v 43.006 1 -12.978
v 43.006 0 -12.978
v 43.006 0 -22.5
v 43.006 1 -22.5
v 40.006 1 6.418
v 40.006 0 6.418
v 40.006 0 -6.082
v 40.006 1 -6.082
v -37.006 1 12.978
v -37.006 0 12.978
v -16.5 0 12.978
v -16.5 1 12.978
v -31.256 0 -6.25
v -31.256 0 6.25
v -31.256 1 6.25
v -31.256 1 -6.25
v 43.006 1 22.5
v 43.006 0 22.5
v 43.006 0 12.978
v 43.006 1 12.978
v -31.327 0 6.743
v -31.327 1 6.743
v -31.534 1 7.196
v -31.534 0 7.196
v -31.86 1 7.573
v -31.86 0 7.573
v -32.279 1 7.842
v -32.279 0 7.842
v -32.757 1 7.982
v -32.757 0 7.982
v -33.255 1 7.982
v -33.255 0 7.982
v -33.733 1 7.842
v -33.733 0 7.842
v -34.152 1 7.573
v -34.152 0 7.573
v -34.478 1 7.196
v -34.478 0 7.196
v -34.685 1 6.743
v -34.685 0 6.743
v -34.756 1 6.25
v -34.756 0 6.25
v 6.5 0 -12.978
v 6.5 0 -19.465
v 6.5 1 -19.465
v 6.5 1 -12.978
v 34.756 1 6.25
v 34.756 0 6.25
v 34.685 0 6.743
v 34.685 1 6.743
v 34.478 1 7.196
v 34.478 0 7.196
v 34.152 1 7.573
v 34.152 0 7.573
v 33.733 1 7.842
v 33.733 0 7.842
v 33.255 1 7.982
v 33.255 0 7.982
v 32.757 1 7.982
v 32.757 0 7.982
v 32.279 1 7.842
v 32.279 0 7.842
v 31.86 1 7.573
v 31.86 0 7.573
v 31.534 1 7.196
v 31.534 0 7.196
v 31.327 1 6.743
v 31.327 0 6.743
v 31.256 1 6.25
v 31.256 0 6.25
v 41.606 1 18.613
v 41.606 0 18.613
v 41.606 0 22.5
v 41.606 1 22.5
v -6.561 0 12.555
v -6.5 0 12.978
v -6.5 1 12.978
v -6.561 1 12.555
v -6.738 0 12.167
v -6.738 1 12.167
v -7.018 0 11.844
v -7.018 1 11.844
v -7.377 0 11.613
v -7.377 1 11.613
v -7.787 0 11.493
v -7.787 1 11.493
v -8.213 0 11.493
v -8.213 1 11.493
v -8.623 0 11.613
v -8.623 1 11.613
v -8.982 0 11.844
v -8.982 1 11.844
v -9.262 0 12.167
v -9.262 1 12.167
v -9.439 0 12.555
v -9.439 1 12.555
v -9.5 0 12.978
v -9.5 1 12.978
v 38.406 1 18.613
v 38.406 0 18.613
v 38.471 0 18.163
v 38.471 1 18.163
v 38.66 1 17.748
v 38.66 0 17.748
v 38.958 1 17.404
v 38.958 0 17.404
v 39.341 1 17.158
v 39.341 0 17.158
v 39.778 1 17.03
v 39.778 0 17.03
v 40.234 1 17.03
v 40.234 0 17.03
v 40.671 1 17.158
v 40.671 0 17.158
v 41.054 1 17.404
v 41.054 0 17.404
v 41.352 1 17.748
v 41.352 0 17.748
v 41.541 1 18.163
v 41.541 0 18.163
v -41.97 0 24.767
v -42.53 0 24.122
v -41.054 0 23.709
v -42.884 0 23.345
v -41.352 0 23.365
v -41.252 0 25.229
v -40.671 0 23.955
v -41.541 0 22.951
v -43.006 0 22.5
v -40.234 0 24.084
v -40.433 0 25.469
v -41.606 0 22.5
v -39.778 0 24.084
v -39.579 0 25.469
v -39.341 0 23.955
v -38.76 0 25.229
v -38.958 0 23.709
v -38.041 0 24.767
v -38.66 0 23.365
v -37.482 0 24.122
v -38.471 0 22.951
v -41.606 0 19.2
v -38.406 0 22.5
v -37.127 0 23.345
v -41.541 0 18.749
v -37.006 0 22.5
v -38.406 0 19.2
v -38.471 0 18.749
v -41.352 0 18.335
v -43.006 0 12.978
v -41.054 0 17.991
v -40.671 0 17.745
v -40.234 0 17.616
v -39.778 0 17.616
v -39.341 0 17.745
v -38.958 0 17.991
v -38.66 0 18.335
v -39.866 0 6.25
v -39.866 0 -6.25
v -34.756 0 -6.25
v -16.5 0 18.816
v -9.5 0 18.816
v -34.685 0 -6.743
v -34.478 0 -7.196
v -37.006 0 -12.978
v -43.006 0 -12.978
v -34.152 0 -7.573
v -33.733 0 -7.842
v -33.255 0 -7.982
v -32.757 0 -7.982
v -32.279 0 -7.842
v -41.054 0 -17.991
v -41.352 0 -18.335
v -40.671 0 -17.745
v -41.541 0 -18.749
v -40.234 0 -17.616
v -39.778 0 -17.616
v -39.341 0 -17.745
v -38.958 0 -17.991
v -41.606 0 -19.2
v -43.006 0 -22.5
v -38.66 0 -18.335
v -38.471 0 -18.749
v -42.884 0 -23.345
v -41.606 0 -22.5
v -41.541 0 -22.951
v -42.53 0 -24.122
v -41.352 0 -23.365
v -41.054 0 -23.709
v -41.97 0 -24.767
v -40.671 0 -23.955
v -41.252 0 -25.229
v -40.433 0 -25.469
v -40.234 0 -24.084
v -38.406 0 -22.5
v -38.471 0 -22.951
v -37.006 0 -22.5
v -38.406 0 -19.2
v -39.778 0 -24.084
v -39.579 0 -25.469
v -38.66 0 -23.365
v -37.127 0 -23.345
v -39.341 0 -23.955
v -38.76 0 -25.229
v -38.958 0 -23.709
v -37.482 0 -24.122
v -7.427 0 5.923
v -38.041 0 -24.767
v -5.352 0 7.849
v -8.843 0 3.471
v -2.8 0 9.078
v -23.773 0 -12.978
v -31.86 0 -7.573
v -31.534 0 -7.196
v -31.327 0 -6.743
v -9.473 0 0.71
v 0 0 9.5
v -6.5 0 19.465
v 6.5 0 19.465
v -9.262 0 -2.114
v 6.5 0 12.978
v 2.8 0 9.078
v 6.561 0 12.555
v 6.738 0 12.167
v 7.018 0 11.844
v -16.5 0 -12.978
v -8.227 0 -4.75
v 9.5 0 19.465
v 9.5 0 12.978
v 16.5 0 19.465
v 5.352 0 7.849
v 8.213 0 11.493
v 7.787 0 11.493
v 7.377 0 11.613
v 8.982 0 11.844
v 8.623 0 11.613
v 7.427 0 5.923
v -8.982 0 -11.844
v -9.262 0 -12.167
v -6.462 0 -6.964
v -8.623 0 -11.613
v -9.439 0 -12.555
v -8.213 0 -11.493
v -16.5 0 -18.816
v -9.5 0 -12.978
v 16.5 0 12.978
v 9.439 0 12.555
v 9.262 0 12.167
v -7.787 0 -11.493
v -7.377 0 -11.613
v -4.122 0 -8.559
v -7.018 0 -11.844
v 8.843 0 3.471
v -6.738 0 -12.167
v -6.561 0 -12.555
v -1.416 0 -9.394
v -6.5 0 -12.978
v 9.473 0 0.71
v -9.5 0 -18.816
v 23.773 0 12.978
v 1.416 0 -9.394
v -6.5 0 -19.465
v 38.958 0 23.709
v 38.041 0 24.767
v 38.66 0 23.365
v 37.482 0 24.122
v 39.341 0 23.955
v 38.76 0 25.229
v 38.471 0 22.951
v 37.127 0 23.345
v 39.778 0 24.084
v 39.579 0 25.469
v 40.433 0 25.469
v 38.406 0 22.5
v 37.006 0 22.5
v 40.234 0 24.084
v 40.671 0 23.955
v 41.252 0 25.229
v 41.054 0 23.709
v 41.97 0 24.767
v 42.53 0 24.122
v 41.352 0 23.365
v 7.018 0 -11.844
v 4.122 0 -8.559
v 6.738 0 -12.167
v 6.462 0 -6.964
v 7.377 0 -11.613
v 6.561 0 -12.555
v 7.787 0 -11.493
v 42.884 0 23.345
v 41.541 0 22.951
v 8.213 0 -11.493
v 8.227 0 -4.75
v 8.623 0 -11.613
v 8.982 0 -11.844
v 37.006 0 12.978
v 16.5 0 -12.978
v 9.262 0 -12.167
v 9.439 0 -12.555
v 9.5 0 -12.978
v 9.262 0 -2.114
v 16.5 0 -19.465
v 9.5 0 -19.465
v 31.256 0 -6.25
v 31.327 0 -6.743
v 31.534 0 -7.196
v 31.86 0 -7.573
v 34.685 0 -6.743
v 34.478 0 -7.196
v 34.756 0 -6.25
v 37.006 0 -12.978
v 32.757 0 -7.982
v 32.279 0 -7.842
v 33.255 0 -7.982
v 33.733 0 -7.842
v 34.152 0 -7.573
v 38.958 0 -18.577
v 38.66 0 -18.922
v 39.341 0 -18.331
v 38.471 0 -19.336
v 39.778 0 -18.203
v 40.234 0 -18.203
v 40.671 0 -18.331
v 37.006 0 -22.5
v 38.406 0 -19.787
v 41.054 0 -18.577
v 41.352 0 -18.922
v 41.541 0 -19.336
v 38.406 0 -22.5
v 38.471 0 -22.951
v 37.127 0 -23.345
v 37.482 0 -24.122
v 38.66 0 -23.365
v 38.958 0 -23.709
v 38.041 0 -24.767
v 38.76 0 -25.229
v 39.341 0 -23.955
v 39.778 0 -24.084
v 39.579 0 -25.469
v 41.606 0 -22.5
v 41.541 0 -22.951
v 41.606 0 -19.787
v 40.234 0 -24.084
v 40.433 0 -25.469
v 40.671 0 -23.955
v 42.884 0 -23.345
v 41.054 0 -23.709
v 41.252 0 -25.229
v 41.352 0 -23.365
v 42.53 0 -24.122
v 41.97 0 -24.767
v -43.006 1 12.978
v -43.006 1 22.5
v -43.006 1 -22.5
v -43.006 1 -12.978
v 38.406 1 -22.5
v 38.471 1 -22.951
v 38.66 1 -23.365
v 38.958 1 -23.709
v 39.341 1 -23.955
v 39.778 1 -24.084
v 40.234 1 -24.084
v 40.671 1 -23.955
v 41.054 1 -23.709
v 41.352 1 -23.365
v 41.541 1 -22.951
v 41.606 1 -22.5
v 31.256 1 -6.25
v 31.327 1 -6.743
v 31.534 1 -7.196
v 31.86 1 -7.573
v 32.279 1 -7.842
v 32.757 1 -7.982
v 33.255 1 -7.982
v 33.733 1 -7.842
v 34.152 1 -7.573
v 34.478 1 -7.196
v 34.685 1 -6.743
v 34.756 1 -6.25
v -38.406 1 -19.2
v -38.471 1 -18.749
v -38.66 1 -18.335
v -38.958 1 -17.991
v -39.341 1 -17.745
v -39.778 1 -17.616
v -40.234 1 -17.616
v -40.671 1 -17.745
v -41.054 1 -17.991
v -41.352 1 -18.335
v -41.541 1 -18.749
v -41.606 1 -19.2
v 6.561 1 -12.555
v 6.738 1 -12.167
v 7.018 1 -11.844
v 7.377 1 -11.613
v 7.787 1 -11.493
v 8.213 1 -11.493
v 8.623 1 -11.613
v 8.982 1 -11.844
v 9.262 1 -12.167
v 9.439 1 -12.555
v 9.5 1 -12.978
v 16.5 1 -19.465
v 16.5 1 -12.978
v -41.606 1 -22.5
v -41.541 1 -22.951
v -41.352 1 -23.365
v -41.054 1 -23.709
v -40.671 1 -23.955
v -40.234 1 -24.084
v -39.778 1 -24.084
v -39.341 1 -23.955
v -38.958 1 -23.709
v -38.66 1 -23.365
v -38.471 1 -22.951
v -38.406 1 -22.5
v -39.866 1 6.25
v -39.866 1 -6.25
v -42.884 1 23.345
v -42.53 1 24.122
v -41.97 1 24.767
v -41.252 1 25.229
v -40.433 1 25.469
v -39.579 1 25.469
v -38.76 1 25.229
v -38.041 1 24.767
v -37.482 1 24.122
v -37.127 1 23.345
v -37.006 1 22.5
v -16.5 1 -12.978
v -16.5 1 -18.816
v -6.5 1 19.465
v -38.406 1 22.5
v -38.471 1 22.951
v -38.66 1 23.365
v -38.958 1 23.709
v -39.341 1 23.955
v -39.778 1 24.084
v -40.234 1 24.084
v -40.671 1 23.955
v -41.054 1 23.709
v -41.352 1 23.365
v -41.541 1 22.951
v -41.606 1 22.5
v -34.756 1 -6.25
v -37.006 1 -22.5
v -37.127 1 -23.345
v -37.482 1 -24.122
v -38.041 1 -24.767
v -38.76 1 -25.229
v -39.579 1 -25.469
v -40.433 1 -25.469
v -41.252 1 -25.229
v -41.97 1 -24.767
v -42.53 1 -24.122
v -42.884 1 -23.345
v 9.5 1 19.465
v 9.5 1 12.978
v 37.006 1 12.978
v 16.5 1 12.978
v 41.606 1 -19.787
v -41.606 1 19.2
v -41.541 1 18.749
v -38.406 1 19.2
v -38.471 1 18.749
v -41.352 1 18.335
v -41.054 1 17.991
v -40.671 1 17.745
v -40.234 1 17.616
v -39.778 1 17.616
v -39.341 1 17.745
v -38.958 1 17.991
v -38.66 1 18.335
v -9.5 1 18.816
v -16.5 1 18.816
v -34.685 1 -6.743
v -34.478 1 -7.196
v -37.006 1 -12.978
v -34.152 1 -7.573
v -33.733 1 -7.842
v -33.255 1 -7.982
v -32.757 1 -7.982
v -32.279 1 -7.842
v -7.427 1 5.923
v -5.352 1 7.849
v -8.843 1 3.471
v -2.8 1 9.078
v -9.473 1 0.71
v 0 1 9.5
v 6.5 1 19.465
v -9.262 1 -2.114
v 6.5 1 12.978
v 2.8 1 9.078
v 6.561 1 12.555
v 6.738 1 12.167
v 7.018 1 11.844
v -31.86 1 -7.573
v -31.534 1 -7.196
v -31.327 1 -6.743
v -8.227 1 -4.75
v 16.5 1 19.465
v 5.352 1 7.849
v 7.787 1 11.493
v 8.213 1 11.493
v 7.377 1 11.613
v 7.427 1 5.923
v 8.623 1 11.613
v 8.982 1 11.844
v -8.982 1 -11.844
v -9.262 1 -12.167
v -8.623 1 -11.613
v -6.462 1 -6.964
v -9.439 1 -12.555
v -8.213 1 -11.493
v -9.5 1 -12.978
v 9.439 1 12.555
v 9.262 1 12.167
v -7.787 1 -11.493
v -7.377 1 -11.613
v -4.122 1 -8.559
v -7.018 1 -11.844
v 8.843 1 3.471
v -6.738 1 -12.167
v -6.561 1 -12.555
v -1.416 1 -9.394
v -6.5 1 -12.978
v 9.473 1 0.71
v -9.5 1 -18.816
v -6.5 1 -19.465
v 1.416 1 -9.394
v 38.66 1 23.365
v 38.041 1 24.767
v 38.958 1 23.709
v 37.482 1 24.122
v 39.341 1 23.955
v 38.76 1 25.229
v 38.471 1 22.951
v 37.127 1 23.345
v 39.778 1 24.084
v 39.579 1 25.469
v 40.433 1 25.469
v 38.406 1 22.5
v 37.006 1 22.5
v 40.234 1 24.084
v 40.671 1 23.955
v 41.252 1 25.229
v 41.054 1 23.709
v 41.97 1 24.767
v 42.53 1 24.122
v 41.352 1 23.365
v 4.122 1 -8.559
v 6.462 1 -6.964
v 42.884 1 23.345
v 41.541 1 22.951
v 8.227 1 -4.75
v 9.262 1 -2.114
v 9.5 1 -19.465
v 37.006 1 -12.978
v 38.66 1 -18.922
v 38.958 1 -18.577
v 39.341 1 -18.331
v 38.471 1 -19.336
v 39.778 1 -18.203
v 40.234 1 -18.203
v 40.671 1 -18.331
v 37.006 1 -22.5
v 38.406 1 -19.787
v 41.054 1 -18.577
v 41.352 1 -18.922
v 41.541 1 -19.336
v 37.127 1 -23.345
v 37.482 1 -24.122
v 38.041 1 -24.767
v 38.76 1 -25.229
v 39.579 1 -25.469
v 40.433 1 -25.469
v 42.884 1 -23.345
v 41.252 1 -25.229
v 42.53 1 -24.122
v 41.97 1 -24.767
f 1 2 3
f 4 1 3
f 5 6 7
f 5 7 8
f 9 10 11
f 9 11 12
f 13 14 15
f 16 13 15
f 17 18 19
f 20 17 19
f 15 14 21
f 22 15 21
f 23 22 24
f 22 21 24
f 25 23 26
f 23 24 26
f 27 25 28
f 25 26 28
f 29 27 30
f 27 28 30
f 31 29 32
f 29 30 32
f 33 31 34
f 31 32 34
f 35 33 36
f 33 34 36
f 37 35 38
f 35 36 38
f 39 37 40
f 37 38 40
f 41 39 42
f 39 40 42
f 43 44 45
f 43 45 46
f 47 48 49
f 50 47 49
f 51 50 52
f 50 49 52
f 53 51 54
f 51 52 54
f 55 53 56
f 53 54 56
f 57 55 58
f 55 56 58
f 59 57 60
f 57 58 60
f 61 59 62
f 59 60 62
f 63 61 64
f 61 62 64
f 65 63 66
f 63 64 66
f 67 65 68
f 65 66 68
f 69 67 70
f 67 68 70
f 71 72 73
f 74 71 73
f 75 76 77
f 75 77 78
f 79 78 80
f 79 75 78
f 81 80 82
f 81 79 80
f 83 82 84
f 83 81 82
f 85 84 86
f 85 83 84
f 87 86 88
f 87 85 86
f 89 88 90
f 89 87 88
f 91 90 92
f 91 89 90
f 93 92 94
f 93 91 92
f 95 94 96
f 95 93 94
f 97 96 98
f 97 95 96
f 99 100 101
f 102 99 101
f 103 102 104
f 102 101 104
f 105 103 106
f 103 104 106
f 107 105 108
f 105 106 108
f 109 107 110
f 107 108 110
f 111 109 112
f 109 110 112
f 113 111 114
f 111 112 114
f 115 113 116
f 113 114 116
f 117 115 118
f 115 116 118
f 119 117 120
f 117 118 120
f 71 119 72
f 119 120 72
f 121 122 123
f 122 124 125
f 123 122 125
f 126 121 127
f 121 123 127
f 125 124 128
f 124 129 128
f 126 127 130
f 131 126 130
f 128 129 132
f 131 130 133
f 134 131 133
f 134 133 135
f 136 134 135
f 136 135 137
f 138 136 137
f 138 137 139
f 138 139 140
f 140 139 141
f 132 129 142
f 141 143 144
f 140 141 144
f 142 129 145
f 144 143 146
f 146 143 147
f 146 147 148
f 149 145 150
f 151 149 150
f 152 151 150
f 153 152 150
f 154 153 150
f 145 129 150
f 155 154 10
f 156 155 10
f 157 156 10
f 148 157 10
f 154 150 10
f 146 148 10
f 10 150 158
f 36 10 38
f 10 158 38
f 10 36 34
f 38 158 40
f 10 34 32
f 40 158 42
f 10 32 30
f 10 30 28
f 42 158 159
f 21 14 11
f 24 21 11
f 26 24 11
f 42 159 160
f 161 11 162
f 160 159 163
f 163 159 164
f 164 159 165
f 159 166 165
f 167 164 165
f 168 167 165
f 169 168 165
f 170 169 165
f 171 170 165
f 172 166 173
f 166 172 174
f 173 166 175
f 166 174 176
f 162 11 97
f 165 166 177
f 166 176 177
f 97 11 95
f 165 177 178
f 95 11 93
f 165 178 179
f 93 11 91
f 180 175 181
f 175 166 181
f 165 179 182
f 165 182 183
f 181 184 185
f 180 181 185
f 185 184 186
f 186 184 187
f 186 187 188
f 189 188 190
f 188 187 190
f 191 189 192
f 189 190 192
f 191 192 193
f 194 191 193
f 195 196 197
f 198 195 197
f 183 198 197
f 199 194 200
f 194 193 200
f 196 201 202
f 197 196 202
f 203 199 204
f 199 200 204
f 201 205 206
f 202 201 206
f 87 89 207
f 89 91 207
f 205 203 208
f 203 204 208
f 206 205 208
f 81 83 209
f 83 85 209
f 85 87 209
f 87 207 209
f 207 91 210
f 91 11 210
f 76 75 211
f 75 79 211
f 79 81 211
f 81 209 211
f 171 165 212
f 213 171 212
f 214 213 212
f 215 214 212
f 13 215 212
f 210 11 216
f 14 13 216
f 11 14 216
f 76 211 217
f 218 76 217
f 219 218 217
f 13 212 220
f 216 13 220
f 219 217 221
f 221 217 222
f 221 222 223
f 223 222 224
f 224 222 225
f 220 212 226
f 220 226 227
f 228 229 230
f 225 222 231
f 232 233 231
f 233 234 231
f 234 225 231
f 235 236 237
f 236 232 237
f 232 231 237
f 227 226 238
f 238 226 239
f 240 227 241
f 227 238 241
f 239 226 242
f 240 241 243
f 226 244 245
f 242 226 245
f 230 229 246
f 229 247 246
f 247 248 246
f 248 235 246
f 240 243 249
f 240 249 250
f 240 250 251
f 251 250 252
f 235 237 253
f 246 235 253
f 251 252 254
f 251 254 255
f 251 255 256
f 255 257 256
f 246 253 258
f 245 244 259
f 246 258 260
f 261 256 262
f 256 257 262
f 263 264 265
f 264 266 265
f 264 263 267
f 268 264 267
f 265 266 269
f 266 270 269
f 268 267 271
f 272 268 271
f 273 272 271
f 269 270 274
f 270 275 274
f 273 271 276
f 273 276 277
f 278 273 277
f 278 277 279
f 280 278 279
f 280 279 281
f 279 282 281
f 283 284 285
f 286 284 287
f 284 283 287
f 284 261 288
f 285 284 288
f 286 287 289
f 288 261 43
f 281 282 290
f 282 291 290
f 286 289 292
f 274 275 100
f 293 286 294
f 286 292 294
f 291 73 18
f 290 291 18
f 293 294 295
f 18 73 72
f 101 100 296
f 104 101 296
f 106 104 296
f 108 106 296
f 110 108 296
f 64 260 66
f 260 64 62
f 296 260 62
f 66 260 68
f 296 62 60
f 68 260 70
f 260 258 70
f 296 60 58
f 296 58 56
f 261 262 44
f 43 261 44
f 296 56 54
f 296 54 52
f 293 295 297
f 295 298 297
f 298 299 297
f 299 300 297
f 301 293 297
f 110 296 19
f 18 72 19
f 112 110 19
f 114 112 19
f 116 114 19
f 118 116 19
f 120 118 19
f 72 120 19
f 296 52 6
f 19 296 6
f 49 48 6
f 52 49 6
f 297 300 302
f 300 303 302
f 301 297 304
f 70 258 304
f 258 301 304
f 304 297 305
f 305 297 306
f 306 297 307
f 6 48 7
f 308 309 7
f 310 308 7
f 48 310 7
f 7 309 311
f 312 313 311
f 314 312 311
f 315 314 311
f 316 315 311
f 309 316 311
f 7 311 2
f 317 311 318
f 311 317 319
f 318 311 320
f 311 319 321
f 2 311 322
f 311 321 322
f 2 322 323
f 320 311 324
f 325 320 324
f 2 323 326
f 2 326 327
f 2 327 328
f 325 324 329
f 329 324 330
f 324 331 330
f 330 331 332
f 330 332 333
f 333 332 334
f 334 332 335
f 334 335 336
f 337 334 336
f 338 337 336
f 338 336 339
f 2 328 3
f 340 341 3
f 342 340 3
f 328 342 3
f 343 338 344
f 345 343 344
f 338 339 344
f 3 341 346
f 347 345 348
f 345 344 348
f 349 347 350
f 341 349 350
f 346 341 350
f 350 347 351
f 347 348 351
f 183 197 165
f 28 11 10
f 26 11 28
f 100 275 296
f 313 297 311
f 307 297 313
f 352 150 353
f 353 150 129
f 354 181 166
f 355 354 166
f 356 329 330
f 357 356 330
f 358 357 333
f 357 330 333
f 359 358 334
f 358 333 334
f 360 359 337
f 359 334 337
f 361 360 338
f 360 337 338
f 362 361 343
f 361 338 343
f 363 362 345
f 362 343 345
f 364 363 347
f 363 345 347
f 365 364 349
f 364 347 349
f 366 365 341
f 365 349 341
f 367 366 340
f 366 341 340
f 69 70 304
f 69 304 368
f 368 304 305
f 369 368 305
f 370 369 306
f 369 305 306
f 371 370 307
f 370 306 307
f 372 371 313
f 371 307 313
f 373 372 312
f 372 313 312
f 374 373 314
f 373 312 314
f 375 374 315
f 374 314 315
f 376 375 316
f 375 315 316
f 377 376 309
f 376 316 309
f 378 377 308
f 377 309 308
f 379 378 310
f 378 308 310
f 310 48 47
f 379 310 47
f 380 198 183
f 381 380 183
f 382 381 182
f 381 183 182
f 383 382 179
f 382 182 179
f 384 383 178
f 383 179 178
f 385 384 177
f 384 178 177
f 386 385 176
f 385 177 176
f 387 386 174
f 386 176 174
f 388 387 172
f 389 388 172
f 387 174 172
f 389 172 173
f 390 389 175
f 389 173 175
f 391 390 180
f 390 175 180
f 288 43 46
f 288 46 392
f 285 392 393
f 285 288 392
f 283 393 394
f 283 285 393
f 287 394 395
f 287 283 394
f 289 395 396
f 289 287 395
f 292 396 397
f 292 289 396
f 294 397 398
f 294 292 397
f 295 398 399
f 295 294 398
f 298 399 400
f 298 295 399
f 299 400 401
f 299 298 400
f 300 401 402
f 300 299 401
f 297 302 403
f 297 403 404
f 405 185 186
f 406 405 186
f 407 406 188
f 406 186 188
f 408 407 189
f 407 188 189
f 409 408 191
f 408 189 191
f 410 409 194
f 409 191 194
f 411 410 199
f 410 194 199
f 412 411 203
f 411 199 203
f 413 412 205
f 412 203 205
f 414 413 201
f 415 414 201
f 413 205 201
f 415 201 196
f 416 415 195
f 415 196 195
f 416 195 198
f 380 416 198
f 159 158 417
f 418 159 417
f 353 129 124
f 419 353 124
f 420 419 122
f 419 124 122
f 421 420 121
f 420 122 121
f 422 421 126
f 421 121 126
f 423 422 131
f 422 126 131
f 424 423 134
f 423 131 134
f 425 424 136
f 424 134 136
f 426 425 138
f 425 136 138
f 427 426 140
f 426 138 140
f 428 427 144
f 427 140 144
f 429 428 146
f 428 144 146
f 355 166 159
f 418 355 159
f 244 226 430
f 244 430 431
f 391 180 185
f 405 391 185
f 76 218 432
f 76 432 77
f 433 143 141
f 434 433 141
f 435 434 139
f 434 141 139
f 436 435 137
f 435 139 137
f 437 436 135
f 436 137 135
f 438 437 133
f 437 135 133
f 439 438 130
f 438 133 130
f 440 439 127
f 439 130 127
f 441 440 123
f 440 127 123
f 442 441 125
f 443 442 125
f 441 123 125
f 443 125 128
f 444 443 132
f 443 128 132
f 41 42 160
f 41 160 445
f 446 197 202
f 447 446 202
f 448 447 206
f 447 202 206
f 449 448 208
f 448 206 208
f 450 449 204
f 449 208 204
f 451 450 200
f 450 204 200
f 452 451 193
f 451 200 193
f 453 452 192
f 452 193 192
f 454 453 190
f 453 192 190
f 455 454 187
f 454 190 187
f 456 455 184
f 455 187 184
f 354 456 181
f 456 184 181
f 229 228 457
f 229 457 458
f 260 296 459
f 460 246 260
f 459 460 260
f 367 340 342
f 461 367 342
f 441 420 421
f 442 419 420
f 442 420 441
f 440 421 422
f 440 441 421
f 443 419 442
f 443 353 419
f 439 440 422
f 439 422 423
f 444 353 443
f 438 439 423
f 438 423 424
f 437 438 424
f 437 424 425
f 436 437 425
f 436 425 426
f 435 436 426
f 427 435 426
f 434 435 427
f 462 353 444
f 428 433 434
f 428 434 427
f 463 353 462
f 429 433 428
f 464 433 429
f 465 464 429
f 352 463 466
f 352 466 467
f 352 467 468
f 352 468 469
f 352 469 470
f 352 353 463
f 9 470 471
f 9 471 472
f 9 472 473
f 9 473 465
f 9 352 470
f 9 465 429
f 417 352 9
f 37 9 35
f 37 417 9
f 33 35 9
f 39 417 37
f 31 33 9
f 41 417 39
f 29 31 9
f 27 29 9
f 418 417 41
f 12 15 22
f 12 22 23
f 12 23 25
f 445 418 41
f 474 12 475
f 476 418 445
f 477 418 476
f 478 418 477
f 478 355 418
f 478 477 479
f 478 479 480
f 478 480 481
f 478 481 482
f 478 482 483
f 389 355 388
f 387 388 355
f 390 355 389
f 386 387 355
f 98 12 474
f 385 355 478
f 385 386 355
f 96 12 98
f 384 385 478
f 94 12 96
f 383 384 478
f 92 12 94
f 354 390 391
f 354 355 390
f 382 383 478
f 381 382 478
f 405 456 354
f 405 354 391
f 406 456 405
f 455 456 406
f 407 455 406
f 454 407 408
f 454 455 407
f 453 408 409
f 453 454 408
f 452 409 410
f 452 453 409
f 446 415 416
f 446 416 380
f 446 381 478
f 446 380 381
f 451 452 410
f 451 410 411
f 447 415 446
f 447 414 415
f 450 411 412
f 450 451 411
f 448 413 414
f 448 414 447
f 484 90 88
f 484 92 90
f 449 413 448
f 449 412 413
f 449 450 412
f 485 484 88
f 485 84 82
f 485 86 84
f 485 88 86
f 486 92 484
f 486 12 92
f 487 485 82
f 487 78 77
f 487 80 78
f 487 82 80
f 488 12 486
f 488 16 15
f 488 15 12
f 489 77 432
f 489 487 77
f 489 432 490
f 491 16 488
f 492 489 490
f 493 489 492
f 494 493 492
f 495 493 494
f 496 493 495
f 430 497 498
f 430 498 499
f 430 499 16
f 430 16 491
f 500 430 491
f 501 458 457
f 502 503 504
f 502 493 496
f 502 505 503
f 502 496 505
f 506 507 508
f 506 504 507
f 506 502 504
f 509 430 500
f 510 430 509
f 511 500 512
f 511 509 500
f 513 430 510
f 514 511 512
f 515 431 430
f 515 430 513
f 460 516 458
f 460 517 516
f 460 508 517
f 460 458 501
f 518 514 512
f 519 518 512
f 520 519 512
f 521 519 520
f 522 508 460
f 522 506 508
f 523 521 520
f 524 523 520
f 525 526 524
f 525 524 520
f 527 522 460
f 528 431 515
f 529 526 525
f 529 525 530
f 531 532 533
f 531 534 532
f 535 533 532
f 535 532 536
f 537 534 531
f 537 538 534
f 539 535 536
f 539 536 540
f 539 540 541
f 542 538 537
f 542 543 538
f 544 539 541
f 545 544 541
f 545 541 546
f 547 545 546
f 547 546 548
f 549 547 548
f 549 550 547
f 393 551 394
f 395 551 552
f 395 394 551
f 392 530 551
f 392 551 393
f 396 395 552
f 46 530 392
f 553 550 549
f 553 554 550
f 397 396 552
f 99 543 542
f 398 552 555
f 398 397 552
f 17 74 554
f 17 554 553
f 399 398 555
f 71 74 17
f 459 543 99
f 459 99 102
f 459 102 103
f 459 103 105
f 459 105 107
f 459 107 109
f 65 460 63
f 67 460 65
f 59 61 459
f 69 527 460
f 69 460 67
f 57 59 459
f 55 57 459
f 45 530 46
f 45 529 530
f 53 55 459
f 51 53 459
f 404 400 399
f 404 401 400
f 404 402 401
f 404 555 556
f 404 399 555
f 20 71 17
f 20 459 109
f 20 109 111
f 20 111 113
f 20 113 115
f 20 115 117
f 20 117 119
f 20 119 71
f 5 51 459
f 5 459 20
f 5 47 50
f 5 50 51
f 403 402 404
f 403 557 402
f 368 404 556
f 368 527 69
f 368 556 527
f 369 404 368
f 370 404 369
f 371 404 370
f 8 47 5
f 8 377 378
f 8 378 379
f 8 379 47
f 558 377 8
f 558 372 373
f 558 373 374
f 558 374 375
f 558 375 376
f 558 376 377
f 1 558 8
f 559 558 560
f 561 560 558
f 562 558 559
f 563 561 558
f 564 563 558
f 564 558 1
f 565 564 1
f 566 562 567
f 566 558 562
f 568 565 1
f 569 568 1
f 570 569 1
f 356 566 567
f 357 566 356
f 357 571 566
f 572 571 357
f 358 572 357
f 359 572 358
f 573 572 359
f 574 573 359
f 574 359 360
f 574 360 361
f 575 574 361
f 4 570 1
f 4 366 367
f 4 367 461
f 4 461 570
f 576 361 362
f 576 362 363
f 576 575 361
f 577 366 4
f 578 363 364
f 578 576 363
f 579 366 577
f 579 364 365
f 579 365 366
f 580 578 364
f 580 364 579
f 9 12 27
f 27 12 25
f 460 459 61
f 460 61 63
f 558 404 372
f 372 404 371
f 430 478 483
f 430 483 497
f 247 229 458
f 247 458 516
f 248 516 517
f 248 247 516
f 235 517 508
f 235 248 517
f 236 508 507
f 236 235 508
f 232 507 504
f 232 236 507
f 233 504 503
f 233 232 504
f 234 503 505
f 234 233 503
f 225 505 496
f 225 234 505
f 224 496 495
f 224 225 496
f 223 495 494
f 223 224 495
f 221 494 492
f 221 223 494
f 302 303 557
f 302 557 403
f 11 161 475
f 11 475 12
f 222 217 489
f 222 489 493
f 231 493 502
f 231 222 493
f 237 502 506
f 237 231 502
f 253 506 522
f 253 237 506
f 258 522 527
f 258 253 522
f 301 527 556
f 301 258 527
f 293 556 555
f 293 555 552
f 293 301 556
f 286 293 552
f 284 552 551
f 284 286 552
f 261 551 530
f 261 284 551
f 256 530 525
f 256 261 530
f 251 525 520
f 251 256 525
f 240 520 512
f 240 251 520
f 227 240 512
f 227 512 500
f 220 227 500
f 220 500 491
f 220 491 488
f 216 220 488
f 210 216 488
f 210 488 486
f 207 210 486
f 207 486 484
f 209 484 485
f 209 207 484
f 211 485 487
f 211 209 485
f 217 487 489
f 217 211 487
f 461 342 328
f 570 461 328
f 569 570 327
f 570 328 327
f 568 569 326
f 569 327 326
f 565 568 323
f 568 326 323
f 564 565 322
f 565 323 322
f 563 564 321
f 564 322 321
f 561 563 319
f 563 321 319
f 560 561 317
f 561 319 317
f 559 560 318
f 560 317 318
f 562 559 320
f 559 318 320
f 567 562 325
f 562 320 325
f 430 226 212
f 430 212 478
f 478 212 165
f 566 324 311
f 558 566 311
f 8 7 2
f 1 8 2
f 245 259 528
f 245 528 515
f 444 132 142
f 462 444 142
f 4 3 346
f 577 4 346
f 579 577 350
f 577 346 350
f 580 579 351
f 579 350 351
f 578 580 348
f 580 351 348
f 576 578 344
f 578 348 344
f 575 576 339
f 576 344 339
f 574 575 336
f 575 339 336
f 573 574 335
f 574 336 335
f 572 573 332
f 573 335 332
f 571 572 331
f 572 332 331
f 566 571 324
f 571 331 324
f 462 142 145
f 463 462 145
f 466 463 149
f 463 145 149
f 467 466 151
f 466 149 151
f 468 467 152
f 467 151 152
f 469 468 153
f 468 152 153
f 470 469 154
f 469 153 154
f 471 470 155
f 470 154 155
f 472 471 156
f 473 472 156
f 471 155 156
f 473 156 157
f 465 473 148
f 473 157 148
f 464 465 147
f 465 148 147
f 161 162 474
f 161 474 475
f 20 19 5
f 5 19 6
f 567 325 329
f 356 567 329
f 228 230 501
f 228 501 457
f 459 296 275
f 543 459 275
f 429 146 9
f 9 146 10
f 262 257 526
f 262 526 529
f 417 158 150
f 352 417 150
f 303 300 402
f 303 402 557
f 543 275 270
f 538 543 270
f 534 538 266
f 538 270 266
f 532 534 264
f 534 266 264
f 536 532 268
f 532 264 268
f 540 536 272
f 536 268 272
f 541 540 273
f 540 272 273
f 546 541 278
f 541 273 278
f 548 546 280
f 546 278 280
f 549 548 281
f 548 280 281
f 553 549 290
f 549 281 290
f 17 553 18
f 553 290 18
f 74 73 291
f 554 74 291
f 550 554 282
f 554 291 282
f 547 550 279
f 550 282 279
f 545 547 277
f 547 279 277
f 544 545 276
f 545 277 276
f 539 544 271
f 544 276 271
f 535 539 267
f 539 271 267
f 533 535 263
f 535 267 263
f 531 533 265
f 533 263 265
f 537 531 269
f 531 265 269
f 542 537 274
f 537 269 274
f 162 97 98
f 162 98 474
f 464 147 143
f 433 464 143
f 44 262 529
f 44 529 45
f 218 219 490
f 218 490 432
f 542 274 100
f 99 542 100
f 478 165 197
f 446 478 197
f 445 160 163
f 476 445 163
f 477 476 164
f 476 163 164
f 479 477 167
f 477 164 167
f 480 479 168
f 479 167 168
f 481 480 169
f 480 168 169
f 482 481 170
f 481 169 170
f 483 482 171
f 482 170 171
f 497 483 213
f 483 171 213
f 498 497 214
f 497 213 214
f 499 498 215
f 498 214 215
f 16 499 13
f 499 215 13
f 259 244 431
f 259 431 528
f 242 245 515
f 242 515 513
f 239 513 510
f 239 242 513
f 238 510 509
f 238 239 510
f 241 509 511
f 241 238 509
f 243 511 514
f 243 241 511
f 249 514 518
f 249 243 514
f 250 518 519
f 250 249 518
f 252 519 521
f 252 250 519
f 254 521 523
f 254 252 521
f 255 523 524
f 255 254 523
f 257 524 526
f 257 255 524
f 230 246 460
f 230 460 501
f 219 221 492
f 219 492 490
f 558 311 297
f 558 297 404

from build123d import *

# Parameters (mm, degrees)
SKETCH1_R                 = 9.5
BASE_FLANGE1_DEPTH        = 1
EDGE_FLANGE1_DEPTH        = 25.955542515
EDGE_FLANGE1_BEND_DEPTH   = 25.955542515
CUT_EXTRUDE1_DEPTH        = 54.438514327
CUT_EXTRUDE1_DEPTH_BACK   = 54.438514327
BOSS_EXTRUDE1_DEPTH       = 1
BOSS_EXTRUDE2_START       = -23.9366
BOSS_EXTRUDE2_DEPTH       = 47.8732
BOSS_EXTRUDE2_START_2     = -31.255846738
BOSS_EXTRUDE2_2_OUTLINE_W = 1
BOSS_EXTRUDE2_2_OUTLINE_H = 25.955542514
BOSS_EXTRUDE2_2_DEPTH     = 14.755846738
BOSS_EXTRUDE2_START_3     = 16.5
BOSS_EXTRUDE2_3_OUTLINE_W = 1
BOSS_EXTRUDE2_3_OUTLINE_H = 25.955542514
BOSS_EXTRUDE2_3_DEPTH     = 14.755846738
BOSS_EXTRUDE2_START_4     = 34.755846738
BOSS_EXTRUDE2_4_OUTLINE_W = 1
BOSS_EXTRUDE2_4_OUTLINE_H = 25.955542514
BOSS_EXTRUDE2_4_DEPTH     = 5.25
BOSS_EXTRUDE2_START_5     = -39.865847056
BOSS_EXTRUDE2_5_OUTLINE_W = 1
BOSS_EXTRUDE2_5_OUTLINE_H = 25.955542514
BOSS_EXTRUDE2_5_DEPTH     = 5.110000318
BOSS_EXTRUDE2_6_DEPTH     = 1


with BuildPart() as part:
    # Base-Flange1: sheet metal written as solids
    # Sketch1 → Base-Flange1 (new body)
    with BuildSketch(Plane(origin=(0, 0, 0), x_dir=(1, 0, 0), z_dir=(0, 1, 0))):
        with BuildLine():
            Line((-22.2, -12.977771257), (-22.2, 12.977771257))
            Line((-22.2, 12.977771257), (-16.5, 12.977771257))
            Line((-16.5, 12.977771257), (-16.5, 18.815937518))
            Line((-16.5, 18.815937518), (-9.5, 18.815937518))
            Line((-9.5, 18.815937518), (-9.5, 12.977771257))
            ThreePointArc((-9.5, 12.977771257), (-8, 11.477771257), (-6.5, 12.977771257))
            Line((-6.5, 12.977771257), (-6.5, 19.464622659))
            Line((-6.5, 19.464622659), (6.5, 19.464622659))
            Line((6.5, 19.464622659), (6.5, 12.977771257))
            ThreePointArc((6.5, 12.977771257), (8, 11.477771257), (9.5, 12.977771257))
            Line((9.5, 12.977771257), (9.5, 19.464622659))
            Line((9.5, 19.464622659), (16.5, 19.464622659))
            Line((16.5, 19.464622659), (16.5, 12.977771257))
            Line((16.5, 12.977771257), (22.2, 12.977771257))
            Line((22.2, 12.977771257), (22.2, -12.977771257))
            Line((22.2, -12.977771257), (16.5, -12.977771257))
            Line((16.5, -12.977771257), (16.5, -19.464622659))
            Line((16.5, -19.464622659), (9.5, -19.464622659))
            Line((9.5, -19.464622659), (9.5, -12.977771257))
            ThreePointArc((9.5, -12.977771257), (8, -11.477771257), (6.5, -12.977771257))
            Line((6.5, -12.977771257), (6.5, -19.464622659))
            Line((6.5, -19.464622659), (-6.5, -19.464622659))
            Line((-6.5, -19.464622659), (-6.5, -12.977771257))
            ThreePointArc((-6.5, -12.977771257), (-8, -11.477771257), (-9.5, -12.977771257))
            Line((-9.5, -12.977771257), (-9.5, -18.815937518))
            Line((-9.5, -18.815937518), (-16.5, -18.815937518))
            Line((-16.5, -18.815937518), (-16.5, -12.977771257))
            Line((-16.5, -12.977771257), (-22.2, -12.977771257))
        make_face()
        with Locations(Location((0, 0, 0), (0, 0, 270))):
            Circle(SKETCH1_R, mode=Mode.SUBTRACT)
    extrude(amount=BASE_FLANGE1_DEPTH)

    # Edge-Flange1: sheet metal written as solids
    # Edge-Flange1 section (on a plane across the edge) → Edge-Flange1 (add)
    with BuildSketch(Plane(origin=(22.9366, 0, -12.977771257), x_dir=(-1, 0, 0), z_dir=(0, 0, 1))):
        with BuildLine():
            Line((-1, 0.7366), (-1, 13.6))
            Line((-1, 13.6), (0, 13.6))
            Line((0, 13.6), (0, 0.7366))
            ThreePointArc((0, 0.7366), (0.215745145, 0.215745145), (0.7366, 0))
            Line((0.7366, 0), (0.7366, -1))
            ThreePointArc((0.7366, -1), (-0.491361636, -0.491361636), (-1, 0.7366))
        make_face()
    extrude(amount=EDGE_FLANGE1_DEPTH)

    # Edge-Flange1 section 2 (on a plane across the edge) → Edge-Flange1 bend (add)
    with BuildSketch(Plane(origin=(-22.9366, 0, 12.977771257), x_dir=(1, 0, 0), z_dir=(0, 0, -1))):
        with BuildLine():
            Line((-1, 0.7366), (-1, 13.6))
            Line((-1, 13.6), (0, 13.6))
            Line((0, 13.6), (0, 0.7366))
            ThreePointArc((0, 0.7366), (0.215745145, 0.215745145), (0.7366, 0))
            Line((0.7366, 0), (0.7366, -1))
            ThreePointArc((0.7366, -1), (-0.491361636, -0.491361636), (-1, 0.7366))
        make_face()
    extrude(amount=EDGE_FLANGE1_BEND_DEPTH)

    # Sketch16 → Cut-Extrude1 (cut, two sides: drawn at the far end of the back side and taken through both)
    with BuildSketch(Plane(origin=(23.9366, 0, 0), x_dir=(0, 0, -1), z_dir=(1, 0, 0)).offset(-CUT_EXTRUDE1_DEPTH_BACK)):
        with BuildLine():
            Line((-6.25, -7.85), (6.25, -7.85))
            ThreePointArc((6.25, -7.85), (8, -9.6), (6.25, -11.35))
            Line((6.25, -11.35), (-6.25, -11.35))
            ThreePointArc((-6.25, -11.35), (-8, -9.6), (-6.25, -7.85))
        make_face()
    extrude(amount=CUT_EXTRUDE1_DEPTH + CUT_EXTRUDE1_DEPTH_BACK, mode=Mode.SUBTRACT)

    # Sketch17 → Boss-Extrude1 (add)
    with BuildSketch(Plane(origin=(23.9366, 0, 0), x_dir=(0, 0, -1), z_dir=(1, 0, 0))):
        with BuildLine():
            Line((12.977771257, -19.6), (22.5, -19.6))
            ThreePointArc((22.5, -19.6), (25.5, -16.6), (22.5, -13.6))
            Line((22.5, -13.6), (12.977771257, -13.6))
            Line((12.977771257, -13.6), (-12.977771257, -13.6))
            Line((-12.977771257, -13.6), (-22.5, -13.6))
            ThreePointArc((-22.5, -13.6), (-25.5, -16.6), (-22.5, -19.6))
            Line((-22.5, -19.6), (-12.977771257, -19.6))
            Line((-12.977771257, -19.6), (-6.418417428, -16.6))
            Line((-6.418417428, -16.6), (6.081582572, -16.6))
            Line((6.081582572, -16.6), (12.977771257, -19.6))
        make_face()
        with BuildLine():
            ThreePointArc((19.786671521, -15), (18.186671521, -16.6), (19.786671521, -18.2))
            Line((19.786671521, -18.2), (22.5, -18.2))
            ThreePointArc((22.5, -18.2), (24.1, -16.6), (22.5, -15))
            Line((22.5, -15), (19.786671521, -15))
        make_face(mode=Mode.SUBTRACT)
        with BuildLine():
            ThreePointArc((-18.613328479, -18.2), (-17.013328479, -16.6), (-18.613328479, -15))
            Line((-18.613328479, -15), (-22.5, -15))
            ThreePointArc((-22.5, -15), (-24.1, -16.6), (-22.5, -18.2))
            Line((-22.5, -18.2), (-18.613328479, -18.2))
        make_face(mode=Mode.SUBTRACT)
    extrude(amount=-BOSS_EXTRUDE1_DEPTH)

    # Boss-Extrude2: read off the stored shape, not the designer's step
    # Boss-Extrude2 outline → Boss-Extrude2 (cut)
    with BuildSketch(Plane.YZ.offset(BOSS_EXTRUDE2_START)):
        with BuildLine():
            Line((0, -12.977771257), (0, 12.977771257))
            Line((0, 12.977771257), (-13.6, 12.977771257))
            Line((-13.6, 12.977771257), (-13.6, 22.5))
            ThreePointArc((-13.6, 22.5), (-16.6, 25.5), (-19.6, 22.5))
            Line((-19.6, 22.5), (-19.6, 12.977771257))
            Line((-19.6, 12.977771257), (-16.6, 6.418417428))
            Line((-16.6, 6.418417428), (-16.6, -6.081582572))
            Line((-16.6, -6.081582572), (-19.6, -12.977771257))
            Line((-19.6, -12.977771257), (-19.6, -22.5))
            ThreePointArc((-19.6, -22.5), (-16.6, -25.5), (-13.6, -22.5))
            Line((-13.6, -22.5), (-13.6, -12.977771257))
            Line((-13.6, -12.977771257), (0, -12.977771257))
        make_face()
        with BuildLine():
            Line((-11.35, -6.25), (-11.35, 6.25))
            ThreePointArc((-11.35, 6.25), (-9.6, 8), (-7.85, 6.25))
            Line((-7.85, 6.25), (-7.85, -6.25))
            ThreePointArc((-7.85, -6.25), (-9.6, -8), (-11.35, -6.25))
        make_face(mode=Mode.SUBTRACT)
        with BuildLine():
            Line((-18.2, 18.613328479), (-18.2, 22.5))
            ThreePointArc((-18.2, 22.5), (-16.6, 24.1), (-15, 22.5))
            Line((-15, 22.5), (-15, 18.613328479))
            ThreePointArc((-15, 18.613328479), (-16.6, 17.013328479), (-18.2, 18.613328479))
        make_face(mode=Mode.SUBTRACT)
        with BuildLine():
            Line((-15, -19.786671521), (-15, -22.5))
            ThreePointArc((-15, -22.5), (-16.6, -24.1), (-18.2, -22.5))
            Line((-18.2, -22.5), (-18.2, -19.786671521))
            ThreePointArc((-18.2, -19.786671521), (-16.6, -18.186671521), (-15, -19.786671521))
        make_face(mode=Mode.SUBTRACT)
    extrude(amount=BOSS_EXTRUDE2_DEPTH, mode=Mode.SUBTRACT)

    # Boss-Extrude2 2 outline → Boss-Extrude2 2 (add)
    with BuildSketch(Plane.YZ.offset(BOSS_EXTRUDE2_START_2)):
        with Locations((0.5, 0)):
            Rectangle(BOSS_EXTRUDE2_2_OUTLINE_W, BOSS_EXTRUDE2_2_OUTLINE_H)
    extrude(amount=BOSS_EXTRUDE2_2_DEPTH)

    # Boss-Extrude2 3 outline → Boss-Extrude2 3 (add)
    with BuildSketch(Plane.YZ.offset(BOSS_EXTRUDE2_START_3)):
        with Locations((0.5, 0)):
            Rectangle(BOSS_EXTRUDE2_3_OUTLINE_W, BOSS_EXTRUDE2_3_OUTLINE_H)
    extrude(amount=BOSS_EXTRUDE2_3_DEPTH)



with BuildPart() as body_2:
    # Boss-Extrude2 4 outline → Boss-Extrude2 4 (new body)
    with BuildSketch(Plane.YZ.offset(BOSS_EXTRUDE2_START_4)):
        with Locations((0.5, 0)):
            Rectangle(BOSS_EXTRUDE2_4_OUTLINE_W, BOSS_EXTRUDE2_4_OUTLINE_H)
    extrude(amount=BOSS_EXTRUDE2_4_DEPTH)


with BuildPart() as body_3:
    # Boss-Extrude2 5 outline → Boss-Extrude2 5 (new body)
    with BuildSketch(Plane.YZ.offset(BOSS_EXTRUDE2_START_5)):
        with Locations((0.5, 0)):
            Rectangle(BOSS_EXTRUDE2_5_OUTLINE_W, BOSS_EXTRUDE2_5_OUTLINE_H)
    extrude(amount=BOSS_EXTRUDE2_5_DEPTH)


with BuildPart() as part_1:
    add(part.part)

    add(body_2.part)  # Boss-Extrude2 6 merges body 2

    add(body_3.part)  # Boss-Extrude2 6 merges body 3
    # Boss-Extrude2 6 outline → Boss-Extrude2 6 (add)
    # profile 1 of 8: a face of its own
    with BuildSketch(Plane(origin=(0, 0, 0), x_dir=(1, 0, 0), z_dir=(0, 1, 0))):
        with BuildLine():
            Line((-34.755846738, 12.977771257), (-34.755846738, 6.25))
            ThreePointArc((-34.755846738, 6.25), (-33.005846738, 8), (-31.255846738, 6.25))
            Line((-31.255846738, 6.25), (-31.255846738, 12.977771257))
            Line((-31.255846738, 12.977771257), (-34.755846738, 12.977771257))
        make_face()
    # profile 2 of 8: a face of its own
    with BuildSketch(Plane(origin=(0, 0, 0), x_dir=(1, 0, 0), z_dir=(0, 1, 0))):
        with BuildLine():
            ThreePointArc((-31.255846738, -6.25), (-33.005846738, -8), (-34.755846738, -6.25))
            Line((-34.755846738, -6.25), (-34.755846738, -12.977771257))
            Line((-34.755846738, -12.977771257), (-31.255846738, -12.977771257))
            Line((-31.255846738, -12.977771257), (-31.255846738, -6.25))
        make_face()
    # profile 3 of 8: a face of its own
    with BuildSketch(Plane(origin=(0, 0, 0), x_dir=(1, 0, 0), z_dir=(0, 1, 0))):
        with BuildLine():
            Line((-39.865847056, 12.977771257), (-37.005846146, 12.977771257))
            Line((-37.005846146, 12.977771257), (-37.005847056, 22.5000001))
            ThreePointArc((-37.005847056, 22.5000001), (-40.005847106, 25.5), (-43.005847056, 22.5))
            Line((-43.005847056, 22.5), (-43.005847056, 12.977771257))
            Line((-43.005847056, 12.977771257), (-39.865847056, 6.25))
            Line((-39.865847056, 6.25), (-39.865847056, 12.977771257))
        make_face()
        with BuildLine():
            ThreePointArc((-38.405847056, 19.2), (-40.005847056, 17.6), (-41.605847056, 19.2))
            Line((-41.605847056, 19.2), (-41.605847056, 22.5))
            ThreePointArc((-41.605847056, 22.5), (-40.005847056, 24.1), (-38.405847056, 22.5))
            Line((-38.405847056, 22.5), (-38.405847056, 19.2))
        make_face(mode=Mode.SUBTRACT)
    # profile 4 of 8: a face of its own
    with BuildSketch(Plane(origin=(0, 0, 0), x_dir=(1, 0, 0), z_dir=(0, 1, 0))):
        with BuildLine():
            Line((-37.005846304, -22.4999999), (-37.005845553, -12.977771257))
            Line((-37.005845553, -12.977771257), (-39.865847056, -12.977771257))
            Line((-39.865847056, -12.977771257), (-39.865847056, -6.25))
            Line((-39.865847056, -6.25), (-43.005847056, -12.977771257))
            Line((-43.005847056, -12.977771257), (-43.005847807, -22.5))
            ThreePointArc((-43.005847807, -22.5), (-40.005847005, -25.500000751), (-37.005846304, -22.4999999))
        make_face()
        with BuildLine():
            Line((-38.405847056, -19.2), (-38.405847056, -22.5))
            ThreePointArc((-38.405847056, -22.5), (-40.005847056, -24.1), (-41.605847056, -22.5))
            Line((-41.605847056, -22.5), (-41.605847056, -19.2))
            ThreePointArc((-41.605847056, -19.2), (-40.005847056, -17.6), (-38.405847056, -19.2))
        make_face(mode=Mode.SUBTRACT)
    # profile 5 of 8: a face of its own
    with BuildSketch(Plane(origin=(0, 0, 0), x_dir=(1, 0, 0), z_dir=(0, 1, 0))):
        with BuildLine():
            ThreePointArc((43.005846738, 22.5), (40.005846738, 25.5), (37.005846738, 22.5))
            Line((37.005846738, 22.5), (37.005846738, 12.977771257))
            Line((37.005846738, 12.977771257), (40.005846738, 12.977771257))
            Line((40.005846738, 12.977771257), (40.005846738, 6.081582572))
            Line((40.005846738, 6.081582572), (43.005846738, 12.977771257))
            Line((43.005846738, 12.977771257), (43.005846738, 22.5))
        make_face()
        with BuildLine():
            Line((38.405846738, 19.786671521), (38.405846738, 22.5))
            ThreePointArc((38.405846738, 22.5), (40.005846738, 24.1), (41.605846738, 22.5))
            Line((41.605846738, 22.5), (41.605846738, 19.786671521))
            ThreePointArc((41.605846738, 19.786671521), (40.005846738, 18.186671521), (38.405846738, 19.786671521))
        make_face(mode=Mode.SUBTRACT)
    # profile 6 of 8: a face of its own
    with BuildSketch(Plane(origin=(0, 0, 0), x_dir=(1, 0, 0), z_dir=(0, 1, 0))):
        with BuildLine():
            Line((34.755846738, 6.25), (34.755846738, 12.977771257))
            Line((34.755846738, 12.977771257), (31.255846738, 12.977771257))
            Line((31.255846738, 12.977771257), (31.255846738, 6.25))
            ThreePointArc((31.255846738, 6.25), (33.005846738, 8), (34.755846738, 6.25))
        make_face()
    # profile 7 of 8: a face of its own
    with BuildSketch(Plane(origin=(0, 0, 0), x_dir=(1, 0, 0), z_dir=(0, 1, 0))):
        with BuildLine():
            Line((34.755846738, -12.977771257), (34.755846738, -6.25))
            ThreePointArc((34.755846738, -6.25), (33.005846738, -8), (31.255846738, -6.25))
            Line((31.255846738, -6.25), (31.255846738, -12.977771257))
            Line((31.255846738, -12.977771257), (34.755846738, -12.977771257))
        make_face()
    # profile 8 of 8: a face of its own
    with BuildSketch(Plane(origin=(0, 0, 0), x_dir=(1, 0, 0), z_dir=(0, 1, 0))):
        with BuildLine():
            Line((43.005846738, -12.977771257), (40.005846738, -6.418417428))
            Line((40.005846738, -6.418417428), (40.005846738, -12.977771257))
            Line((40.005846738, -12.977771257), (37.005846738, -12.977771257))
            Line((37.005846738, -12.977771257), (37.005846738, -22.5))
            ThreePointArc((37.005846738, -22.5), (40.005846738, -25.5), (43.005846738, -22.5))
            Line((43.005846738, -22.5), (43.005846738, -12.977771257))
        make_face()
        with BuildLine():
            ThreePointArc((41.605846738, -22.5), (40.005846738, -24.1), (38.405846738, -22.5))
            Line((38.405846738, -22.5), (38.405846738, -18.613328479))
            ThreePointArc((38.405846738, -18.613328479), (40.005846738, -17.013328479), (41.605846738, -18.613328479))
            Line((41.605846738, -18.613328479), (41.605846738, -22.5))
        make_face(mode=Mode.SUBTRACT)
    extrude(amount=BOSS_EXTRUDE2_6_DEPTH)


solid = part_1.part
